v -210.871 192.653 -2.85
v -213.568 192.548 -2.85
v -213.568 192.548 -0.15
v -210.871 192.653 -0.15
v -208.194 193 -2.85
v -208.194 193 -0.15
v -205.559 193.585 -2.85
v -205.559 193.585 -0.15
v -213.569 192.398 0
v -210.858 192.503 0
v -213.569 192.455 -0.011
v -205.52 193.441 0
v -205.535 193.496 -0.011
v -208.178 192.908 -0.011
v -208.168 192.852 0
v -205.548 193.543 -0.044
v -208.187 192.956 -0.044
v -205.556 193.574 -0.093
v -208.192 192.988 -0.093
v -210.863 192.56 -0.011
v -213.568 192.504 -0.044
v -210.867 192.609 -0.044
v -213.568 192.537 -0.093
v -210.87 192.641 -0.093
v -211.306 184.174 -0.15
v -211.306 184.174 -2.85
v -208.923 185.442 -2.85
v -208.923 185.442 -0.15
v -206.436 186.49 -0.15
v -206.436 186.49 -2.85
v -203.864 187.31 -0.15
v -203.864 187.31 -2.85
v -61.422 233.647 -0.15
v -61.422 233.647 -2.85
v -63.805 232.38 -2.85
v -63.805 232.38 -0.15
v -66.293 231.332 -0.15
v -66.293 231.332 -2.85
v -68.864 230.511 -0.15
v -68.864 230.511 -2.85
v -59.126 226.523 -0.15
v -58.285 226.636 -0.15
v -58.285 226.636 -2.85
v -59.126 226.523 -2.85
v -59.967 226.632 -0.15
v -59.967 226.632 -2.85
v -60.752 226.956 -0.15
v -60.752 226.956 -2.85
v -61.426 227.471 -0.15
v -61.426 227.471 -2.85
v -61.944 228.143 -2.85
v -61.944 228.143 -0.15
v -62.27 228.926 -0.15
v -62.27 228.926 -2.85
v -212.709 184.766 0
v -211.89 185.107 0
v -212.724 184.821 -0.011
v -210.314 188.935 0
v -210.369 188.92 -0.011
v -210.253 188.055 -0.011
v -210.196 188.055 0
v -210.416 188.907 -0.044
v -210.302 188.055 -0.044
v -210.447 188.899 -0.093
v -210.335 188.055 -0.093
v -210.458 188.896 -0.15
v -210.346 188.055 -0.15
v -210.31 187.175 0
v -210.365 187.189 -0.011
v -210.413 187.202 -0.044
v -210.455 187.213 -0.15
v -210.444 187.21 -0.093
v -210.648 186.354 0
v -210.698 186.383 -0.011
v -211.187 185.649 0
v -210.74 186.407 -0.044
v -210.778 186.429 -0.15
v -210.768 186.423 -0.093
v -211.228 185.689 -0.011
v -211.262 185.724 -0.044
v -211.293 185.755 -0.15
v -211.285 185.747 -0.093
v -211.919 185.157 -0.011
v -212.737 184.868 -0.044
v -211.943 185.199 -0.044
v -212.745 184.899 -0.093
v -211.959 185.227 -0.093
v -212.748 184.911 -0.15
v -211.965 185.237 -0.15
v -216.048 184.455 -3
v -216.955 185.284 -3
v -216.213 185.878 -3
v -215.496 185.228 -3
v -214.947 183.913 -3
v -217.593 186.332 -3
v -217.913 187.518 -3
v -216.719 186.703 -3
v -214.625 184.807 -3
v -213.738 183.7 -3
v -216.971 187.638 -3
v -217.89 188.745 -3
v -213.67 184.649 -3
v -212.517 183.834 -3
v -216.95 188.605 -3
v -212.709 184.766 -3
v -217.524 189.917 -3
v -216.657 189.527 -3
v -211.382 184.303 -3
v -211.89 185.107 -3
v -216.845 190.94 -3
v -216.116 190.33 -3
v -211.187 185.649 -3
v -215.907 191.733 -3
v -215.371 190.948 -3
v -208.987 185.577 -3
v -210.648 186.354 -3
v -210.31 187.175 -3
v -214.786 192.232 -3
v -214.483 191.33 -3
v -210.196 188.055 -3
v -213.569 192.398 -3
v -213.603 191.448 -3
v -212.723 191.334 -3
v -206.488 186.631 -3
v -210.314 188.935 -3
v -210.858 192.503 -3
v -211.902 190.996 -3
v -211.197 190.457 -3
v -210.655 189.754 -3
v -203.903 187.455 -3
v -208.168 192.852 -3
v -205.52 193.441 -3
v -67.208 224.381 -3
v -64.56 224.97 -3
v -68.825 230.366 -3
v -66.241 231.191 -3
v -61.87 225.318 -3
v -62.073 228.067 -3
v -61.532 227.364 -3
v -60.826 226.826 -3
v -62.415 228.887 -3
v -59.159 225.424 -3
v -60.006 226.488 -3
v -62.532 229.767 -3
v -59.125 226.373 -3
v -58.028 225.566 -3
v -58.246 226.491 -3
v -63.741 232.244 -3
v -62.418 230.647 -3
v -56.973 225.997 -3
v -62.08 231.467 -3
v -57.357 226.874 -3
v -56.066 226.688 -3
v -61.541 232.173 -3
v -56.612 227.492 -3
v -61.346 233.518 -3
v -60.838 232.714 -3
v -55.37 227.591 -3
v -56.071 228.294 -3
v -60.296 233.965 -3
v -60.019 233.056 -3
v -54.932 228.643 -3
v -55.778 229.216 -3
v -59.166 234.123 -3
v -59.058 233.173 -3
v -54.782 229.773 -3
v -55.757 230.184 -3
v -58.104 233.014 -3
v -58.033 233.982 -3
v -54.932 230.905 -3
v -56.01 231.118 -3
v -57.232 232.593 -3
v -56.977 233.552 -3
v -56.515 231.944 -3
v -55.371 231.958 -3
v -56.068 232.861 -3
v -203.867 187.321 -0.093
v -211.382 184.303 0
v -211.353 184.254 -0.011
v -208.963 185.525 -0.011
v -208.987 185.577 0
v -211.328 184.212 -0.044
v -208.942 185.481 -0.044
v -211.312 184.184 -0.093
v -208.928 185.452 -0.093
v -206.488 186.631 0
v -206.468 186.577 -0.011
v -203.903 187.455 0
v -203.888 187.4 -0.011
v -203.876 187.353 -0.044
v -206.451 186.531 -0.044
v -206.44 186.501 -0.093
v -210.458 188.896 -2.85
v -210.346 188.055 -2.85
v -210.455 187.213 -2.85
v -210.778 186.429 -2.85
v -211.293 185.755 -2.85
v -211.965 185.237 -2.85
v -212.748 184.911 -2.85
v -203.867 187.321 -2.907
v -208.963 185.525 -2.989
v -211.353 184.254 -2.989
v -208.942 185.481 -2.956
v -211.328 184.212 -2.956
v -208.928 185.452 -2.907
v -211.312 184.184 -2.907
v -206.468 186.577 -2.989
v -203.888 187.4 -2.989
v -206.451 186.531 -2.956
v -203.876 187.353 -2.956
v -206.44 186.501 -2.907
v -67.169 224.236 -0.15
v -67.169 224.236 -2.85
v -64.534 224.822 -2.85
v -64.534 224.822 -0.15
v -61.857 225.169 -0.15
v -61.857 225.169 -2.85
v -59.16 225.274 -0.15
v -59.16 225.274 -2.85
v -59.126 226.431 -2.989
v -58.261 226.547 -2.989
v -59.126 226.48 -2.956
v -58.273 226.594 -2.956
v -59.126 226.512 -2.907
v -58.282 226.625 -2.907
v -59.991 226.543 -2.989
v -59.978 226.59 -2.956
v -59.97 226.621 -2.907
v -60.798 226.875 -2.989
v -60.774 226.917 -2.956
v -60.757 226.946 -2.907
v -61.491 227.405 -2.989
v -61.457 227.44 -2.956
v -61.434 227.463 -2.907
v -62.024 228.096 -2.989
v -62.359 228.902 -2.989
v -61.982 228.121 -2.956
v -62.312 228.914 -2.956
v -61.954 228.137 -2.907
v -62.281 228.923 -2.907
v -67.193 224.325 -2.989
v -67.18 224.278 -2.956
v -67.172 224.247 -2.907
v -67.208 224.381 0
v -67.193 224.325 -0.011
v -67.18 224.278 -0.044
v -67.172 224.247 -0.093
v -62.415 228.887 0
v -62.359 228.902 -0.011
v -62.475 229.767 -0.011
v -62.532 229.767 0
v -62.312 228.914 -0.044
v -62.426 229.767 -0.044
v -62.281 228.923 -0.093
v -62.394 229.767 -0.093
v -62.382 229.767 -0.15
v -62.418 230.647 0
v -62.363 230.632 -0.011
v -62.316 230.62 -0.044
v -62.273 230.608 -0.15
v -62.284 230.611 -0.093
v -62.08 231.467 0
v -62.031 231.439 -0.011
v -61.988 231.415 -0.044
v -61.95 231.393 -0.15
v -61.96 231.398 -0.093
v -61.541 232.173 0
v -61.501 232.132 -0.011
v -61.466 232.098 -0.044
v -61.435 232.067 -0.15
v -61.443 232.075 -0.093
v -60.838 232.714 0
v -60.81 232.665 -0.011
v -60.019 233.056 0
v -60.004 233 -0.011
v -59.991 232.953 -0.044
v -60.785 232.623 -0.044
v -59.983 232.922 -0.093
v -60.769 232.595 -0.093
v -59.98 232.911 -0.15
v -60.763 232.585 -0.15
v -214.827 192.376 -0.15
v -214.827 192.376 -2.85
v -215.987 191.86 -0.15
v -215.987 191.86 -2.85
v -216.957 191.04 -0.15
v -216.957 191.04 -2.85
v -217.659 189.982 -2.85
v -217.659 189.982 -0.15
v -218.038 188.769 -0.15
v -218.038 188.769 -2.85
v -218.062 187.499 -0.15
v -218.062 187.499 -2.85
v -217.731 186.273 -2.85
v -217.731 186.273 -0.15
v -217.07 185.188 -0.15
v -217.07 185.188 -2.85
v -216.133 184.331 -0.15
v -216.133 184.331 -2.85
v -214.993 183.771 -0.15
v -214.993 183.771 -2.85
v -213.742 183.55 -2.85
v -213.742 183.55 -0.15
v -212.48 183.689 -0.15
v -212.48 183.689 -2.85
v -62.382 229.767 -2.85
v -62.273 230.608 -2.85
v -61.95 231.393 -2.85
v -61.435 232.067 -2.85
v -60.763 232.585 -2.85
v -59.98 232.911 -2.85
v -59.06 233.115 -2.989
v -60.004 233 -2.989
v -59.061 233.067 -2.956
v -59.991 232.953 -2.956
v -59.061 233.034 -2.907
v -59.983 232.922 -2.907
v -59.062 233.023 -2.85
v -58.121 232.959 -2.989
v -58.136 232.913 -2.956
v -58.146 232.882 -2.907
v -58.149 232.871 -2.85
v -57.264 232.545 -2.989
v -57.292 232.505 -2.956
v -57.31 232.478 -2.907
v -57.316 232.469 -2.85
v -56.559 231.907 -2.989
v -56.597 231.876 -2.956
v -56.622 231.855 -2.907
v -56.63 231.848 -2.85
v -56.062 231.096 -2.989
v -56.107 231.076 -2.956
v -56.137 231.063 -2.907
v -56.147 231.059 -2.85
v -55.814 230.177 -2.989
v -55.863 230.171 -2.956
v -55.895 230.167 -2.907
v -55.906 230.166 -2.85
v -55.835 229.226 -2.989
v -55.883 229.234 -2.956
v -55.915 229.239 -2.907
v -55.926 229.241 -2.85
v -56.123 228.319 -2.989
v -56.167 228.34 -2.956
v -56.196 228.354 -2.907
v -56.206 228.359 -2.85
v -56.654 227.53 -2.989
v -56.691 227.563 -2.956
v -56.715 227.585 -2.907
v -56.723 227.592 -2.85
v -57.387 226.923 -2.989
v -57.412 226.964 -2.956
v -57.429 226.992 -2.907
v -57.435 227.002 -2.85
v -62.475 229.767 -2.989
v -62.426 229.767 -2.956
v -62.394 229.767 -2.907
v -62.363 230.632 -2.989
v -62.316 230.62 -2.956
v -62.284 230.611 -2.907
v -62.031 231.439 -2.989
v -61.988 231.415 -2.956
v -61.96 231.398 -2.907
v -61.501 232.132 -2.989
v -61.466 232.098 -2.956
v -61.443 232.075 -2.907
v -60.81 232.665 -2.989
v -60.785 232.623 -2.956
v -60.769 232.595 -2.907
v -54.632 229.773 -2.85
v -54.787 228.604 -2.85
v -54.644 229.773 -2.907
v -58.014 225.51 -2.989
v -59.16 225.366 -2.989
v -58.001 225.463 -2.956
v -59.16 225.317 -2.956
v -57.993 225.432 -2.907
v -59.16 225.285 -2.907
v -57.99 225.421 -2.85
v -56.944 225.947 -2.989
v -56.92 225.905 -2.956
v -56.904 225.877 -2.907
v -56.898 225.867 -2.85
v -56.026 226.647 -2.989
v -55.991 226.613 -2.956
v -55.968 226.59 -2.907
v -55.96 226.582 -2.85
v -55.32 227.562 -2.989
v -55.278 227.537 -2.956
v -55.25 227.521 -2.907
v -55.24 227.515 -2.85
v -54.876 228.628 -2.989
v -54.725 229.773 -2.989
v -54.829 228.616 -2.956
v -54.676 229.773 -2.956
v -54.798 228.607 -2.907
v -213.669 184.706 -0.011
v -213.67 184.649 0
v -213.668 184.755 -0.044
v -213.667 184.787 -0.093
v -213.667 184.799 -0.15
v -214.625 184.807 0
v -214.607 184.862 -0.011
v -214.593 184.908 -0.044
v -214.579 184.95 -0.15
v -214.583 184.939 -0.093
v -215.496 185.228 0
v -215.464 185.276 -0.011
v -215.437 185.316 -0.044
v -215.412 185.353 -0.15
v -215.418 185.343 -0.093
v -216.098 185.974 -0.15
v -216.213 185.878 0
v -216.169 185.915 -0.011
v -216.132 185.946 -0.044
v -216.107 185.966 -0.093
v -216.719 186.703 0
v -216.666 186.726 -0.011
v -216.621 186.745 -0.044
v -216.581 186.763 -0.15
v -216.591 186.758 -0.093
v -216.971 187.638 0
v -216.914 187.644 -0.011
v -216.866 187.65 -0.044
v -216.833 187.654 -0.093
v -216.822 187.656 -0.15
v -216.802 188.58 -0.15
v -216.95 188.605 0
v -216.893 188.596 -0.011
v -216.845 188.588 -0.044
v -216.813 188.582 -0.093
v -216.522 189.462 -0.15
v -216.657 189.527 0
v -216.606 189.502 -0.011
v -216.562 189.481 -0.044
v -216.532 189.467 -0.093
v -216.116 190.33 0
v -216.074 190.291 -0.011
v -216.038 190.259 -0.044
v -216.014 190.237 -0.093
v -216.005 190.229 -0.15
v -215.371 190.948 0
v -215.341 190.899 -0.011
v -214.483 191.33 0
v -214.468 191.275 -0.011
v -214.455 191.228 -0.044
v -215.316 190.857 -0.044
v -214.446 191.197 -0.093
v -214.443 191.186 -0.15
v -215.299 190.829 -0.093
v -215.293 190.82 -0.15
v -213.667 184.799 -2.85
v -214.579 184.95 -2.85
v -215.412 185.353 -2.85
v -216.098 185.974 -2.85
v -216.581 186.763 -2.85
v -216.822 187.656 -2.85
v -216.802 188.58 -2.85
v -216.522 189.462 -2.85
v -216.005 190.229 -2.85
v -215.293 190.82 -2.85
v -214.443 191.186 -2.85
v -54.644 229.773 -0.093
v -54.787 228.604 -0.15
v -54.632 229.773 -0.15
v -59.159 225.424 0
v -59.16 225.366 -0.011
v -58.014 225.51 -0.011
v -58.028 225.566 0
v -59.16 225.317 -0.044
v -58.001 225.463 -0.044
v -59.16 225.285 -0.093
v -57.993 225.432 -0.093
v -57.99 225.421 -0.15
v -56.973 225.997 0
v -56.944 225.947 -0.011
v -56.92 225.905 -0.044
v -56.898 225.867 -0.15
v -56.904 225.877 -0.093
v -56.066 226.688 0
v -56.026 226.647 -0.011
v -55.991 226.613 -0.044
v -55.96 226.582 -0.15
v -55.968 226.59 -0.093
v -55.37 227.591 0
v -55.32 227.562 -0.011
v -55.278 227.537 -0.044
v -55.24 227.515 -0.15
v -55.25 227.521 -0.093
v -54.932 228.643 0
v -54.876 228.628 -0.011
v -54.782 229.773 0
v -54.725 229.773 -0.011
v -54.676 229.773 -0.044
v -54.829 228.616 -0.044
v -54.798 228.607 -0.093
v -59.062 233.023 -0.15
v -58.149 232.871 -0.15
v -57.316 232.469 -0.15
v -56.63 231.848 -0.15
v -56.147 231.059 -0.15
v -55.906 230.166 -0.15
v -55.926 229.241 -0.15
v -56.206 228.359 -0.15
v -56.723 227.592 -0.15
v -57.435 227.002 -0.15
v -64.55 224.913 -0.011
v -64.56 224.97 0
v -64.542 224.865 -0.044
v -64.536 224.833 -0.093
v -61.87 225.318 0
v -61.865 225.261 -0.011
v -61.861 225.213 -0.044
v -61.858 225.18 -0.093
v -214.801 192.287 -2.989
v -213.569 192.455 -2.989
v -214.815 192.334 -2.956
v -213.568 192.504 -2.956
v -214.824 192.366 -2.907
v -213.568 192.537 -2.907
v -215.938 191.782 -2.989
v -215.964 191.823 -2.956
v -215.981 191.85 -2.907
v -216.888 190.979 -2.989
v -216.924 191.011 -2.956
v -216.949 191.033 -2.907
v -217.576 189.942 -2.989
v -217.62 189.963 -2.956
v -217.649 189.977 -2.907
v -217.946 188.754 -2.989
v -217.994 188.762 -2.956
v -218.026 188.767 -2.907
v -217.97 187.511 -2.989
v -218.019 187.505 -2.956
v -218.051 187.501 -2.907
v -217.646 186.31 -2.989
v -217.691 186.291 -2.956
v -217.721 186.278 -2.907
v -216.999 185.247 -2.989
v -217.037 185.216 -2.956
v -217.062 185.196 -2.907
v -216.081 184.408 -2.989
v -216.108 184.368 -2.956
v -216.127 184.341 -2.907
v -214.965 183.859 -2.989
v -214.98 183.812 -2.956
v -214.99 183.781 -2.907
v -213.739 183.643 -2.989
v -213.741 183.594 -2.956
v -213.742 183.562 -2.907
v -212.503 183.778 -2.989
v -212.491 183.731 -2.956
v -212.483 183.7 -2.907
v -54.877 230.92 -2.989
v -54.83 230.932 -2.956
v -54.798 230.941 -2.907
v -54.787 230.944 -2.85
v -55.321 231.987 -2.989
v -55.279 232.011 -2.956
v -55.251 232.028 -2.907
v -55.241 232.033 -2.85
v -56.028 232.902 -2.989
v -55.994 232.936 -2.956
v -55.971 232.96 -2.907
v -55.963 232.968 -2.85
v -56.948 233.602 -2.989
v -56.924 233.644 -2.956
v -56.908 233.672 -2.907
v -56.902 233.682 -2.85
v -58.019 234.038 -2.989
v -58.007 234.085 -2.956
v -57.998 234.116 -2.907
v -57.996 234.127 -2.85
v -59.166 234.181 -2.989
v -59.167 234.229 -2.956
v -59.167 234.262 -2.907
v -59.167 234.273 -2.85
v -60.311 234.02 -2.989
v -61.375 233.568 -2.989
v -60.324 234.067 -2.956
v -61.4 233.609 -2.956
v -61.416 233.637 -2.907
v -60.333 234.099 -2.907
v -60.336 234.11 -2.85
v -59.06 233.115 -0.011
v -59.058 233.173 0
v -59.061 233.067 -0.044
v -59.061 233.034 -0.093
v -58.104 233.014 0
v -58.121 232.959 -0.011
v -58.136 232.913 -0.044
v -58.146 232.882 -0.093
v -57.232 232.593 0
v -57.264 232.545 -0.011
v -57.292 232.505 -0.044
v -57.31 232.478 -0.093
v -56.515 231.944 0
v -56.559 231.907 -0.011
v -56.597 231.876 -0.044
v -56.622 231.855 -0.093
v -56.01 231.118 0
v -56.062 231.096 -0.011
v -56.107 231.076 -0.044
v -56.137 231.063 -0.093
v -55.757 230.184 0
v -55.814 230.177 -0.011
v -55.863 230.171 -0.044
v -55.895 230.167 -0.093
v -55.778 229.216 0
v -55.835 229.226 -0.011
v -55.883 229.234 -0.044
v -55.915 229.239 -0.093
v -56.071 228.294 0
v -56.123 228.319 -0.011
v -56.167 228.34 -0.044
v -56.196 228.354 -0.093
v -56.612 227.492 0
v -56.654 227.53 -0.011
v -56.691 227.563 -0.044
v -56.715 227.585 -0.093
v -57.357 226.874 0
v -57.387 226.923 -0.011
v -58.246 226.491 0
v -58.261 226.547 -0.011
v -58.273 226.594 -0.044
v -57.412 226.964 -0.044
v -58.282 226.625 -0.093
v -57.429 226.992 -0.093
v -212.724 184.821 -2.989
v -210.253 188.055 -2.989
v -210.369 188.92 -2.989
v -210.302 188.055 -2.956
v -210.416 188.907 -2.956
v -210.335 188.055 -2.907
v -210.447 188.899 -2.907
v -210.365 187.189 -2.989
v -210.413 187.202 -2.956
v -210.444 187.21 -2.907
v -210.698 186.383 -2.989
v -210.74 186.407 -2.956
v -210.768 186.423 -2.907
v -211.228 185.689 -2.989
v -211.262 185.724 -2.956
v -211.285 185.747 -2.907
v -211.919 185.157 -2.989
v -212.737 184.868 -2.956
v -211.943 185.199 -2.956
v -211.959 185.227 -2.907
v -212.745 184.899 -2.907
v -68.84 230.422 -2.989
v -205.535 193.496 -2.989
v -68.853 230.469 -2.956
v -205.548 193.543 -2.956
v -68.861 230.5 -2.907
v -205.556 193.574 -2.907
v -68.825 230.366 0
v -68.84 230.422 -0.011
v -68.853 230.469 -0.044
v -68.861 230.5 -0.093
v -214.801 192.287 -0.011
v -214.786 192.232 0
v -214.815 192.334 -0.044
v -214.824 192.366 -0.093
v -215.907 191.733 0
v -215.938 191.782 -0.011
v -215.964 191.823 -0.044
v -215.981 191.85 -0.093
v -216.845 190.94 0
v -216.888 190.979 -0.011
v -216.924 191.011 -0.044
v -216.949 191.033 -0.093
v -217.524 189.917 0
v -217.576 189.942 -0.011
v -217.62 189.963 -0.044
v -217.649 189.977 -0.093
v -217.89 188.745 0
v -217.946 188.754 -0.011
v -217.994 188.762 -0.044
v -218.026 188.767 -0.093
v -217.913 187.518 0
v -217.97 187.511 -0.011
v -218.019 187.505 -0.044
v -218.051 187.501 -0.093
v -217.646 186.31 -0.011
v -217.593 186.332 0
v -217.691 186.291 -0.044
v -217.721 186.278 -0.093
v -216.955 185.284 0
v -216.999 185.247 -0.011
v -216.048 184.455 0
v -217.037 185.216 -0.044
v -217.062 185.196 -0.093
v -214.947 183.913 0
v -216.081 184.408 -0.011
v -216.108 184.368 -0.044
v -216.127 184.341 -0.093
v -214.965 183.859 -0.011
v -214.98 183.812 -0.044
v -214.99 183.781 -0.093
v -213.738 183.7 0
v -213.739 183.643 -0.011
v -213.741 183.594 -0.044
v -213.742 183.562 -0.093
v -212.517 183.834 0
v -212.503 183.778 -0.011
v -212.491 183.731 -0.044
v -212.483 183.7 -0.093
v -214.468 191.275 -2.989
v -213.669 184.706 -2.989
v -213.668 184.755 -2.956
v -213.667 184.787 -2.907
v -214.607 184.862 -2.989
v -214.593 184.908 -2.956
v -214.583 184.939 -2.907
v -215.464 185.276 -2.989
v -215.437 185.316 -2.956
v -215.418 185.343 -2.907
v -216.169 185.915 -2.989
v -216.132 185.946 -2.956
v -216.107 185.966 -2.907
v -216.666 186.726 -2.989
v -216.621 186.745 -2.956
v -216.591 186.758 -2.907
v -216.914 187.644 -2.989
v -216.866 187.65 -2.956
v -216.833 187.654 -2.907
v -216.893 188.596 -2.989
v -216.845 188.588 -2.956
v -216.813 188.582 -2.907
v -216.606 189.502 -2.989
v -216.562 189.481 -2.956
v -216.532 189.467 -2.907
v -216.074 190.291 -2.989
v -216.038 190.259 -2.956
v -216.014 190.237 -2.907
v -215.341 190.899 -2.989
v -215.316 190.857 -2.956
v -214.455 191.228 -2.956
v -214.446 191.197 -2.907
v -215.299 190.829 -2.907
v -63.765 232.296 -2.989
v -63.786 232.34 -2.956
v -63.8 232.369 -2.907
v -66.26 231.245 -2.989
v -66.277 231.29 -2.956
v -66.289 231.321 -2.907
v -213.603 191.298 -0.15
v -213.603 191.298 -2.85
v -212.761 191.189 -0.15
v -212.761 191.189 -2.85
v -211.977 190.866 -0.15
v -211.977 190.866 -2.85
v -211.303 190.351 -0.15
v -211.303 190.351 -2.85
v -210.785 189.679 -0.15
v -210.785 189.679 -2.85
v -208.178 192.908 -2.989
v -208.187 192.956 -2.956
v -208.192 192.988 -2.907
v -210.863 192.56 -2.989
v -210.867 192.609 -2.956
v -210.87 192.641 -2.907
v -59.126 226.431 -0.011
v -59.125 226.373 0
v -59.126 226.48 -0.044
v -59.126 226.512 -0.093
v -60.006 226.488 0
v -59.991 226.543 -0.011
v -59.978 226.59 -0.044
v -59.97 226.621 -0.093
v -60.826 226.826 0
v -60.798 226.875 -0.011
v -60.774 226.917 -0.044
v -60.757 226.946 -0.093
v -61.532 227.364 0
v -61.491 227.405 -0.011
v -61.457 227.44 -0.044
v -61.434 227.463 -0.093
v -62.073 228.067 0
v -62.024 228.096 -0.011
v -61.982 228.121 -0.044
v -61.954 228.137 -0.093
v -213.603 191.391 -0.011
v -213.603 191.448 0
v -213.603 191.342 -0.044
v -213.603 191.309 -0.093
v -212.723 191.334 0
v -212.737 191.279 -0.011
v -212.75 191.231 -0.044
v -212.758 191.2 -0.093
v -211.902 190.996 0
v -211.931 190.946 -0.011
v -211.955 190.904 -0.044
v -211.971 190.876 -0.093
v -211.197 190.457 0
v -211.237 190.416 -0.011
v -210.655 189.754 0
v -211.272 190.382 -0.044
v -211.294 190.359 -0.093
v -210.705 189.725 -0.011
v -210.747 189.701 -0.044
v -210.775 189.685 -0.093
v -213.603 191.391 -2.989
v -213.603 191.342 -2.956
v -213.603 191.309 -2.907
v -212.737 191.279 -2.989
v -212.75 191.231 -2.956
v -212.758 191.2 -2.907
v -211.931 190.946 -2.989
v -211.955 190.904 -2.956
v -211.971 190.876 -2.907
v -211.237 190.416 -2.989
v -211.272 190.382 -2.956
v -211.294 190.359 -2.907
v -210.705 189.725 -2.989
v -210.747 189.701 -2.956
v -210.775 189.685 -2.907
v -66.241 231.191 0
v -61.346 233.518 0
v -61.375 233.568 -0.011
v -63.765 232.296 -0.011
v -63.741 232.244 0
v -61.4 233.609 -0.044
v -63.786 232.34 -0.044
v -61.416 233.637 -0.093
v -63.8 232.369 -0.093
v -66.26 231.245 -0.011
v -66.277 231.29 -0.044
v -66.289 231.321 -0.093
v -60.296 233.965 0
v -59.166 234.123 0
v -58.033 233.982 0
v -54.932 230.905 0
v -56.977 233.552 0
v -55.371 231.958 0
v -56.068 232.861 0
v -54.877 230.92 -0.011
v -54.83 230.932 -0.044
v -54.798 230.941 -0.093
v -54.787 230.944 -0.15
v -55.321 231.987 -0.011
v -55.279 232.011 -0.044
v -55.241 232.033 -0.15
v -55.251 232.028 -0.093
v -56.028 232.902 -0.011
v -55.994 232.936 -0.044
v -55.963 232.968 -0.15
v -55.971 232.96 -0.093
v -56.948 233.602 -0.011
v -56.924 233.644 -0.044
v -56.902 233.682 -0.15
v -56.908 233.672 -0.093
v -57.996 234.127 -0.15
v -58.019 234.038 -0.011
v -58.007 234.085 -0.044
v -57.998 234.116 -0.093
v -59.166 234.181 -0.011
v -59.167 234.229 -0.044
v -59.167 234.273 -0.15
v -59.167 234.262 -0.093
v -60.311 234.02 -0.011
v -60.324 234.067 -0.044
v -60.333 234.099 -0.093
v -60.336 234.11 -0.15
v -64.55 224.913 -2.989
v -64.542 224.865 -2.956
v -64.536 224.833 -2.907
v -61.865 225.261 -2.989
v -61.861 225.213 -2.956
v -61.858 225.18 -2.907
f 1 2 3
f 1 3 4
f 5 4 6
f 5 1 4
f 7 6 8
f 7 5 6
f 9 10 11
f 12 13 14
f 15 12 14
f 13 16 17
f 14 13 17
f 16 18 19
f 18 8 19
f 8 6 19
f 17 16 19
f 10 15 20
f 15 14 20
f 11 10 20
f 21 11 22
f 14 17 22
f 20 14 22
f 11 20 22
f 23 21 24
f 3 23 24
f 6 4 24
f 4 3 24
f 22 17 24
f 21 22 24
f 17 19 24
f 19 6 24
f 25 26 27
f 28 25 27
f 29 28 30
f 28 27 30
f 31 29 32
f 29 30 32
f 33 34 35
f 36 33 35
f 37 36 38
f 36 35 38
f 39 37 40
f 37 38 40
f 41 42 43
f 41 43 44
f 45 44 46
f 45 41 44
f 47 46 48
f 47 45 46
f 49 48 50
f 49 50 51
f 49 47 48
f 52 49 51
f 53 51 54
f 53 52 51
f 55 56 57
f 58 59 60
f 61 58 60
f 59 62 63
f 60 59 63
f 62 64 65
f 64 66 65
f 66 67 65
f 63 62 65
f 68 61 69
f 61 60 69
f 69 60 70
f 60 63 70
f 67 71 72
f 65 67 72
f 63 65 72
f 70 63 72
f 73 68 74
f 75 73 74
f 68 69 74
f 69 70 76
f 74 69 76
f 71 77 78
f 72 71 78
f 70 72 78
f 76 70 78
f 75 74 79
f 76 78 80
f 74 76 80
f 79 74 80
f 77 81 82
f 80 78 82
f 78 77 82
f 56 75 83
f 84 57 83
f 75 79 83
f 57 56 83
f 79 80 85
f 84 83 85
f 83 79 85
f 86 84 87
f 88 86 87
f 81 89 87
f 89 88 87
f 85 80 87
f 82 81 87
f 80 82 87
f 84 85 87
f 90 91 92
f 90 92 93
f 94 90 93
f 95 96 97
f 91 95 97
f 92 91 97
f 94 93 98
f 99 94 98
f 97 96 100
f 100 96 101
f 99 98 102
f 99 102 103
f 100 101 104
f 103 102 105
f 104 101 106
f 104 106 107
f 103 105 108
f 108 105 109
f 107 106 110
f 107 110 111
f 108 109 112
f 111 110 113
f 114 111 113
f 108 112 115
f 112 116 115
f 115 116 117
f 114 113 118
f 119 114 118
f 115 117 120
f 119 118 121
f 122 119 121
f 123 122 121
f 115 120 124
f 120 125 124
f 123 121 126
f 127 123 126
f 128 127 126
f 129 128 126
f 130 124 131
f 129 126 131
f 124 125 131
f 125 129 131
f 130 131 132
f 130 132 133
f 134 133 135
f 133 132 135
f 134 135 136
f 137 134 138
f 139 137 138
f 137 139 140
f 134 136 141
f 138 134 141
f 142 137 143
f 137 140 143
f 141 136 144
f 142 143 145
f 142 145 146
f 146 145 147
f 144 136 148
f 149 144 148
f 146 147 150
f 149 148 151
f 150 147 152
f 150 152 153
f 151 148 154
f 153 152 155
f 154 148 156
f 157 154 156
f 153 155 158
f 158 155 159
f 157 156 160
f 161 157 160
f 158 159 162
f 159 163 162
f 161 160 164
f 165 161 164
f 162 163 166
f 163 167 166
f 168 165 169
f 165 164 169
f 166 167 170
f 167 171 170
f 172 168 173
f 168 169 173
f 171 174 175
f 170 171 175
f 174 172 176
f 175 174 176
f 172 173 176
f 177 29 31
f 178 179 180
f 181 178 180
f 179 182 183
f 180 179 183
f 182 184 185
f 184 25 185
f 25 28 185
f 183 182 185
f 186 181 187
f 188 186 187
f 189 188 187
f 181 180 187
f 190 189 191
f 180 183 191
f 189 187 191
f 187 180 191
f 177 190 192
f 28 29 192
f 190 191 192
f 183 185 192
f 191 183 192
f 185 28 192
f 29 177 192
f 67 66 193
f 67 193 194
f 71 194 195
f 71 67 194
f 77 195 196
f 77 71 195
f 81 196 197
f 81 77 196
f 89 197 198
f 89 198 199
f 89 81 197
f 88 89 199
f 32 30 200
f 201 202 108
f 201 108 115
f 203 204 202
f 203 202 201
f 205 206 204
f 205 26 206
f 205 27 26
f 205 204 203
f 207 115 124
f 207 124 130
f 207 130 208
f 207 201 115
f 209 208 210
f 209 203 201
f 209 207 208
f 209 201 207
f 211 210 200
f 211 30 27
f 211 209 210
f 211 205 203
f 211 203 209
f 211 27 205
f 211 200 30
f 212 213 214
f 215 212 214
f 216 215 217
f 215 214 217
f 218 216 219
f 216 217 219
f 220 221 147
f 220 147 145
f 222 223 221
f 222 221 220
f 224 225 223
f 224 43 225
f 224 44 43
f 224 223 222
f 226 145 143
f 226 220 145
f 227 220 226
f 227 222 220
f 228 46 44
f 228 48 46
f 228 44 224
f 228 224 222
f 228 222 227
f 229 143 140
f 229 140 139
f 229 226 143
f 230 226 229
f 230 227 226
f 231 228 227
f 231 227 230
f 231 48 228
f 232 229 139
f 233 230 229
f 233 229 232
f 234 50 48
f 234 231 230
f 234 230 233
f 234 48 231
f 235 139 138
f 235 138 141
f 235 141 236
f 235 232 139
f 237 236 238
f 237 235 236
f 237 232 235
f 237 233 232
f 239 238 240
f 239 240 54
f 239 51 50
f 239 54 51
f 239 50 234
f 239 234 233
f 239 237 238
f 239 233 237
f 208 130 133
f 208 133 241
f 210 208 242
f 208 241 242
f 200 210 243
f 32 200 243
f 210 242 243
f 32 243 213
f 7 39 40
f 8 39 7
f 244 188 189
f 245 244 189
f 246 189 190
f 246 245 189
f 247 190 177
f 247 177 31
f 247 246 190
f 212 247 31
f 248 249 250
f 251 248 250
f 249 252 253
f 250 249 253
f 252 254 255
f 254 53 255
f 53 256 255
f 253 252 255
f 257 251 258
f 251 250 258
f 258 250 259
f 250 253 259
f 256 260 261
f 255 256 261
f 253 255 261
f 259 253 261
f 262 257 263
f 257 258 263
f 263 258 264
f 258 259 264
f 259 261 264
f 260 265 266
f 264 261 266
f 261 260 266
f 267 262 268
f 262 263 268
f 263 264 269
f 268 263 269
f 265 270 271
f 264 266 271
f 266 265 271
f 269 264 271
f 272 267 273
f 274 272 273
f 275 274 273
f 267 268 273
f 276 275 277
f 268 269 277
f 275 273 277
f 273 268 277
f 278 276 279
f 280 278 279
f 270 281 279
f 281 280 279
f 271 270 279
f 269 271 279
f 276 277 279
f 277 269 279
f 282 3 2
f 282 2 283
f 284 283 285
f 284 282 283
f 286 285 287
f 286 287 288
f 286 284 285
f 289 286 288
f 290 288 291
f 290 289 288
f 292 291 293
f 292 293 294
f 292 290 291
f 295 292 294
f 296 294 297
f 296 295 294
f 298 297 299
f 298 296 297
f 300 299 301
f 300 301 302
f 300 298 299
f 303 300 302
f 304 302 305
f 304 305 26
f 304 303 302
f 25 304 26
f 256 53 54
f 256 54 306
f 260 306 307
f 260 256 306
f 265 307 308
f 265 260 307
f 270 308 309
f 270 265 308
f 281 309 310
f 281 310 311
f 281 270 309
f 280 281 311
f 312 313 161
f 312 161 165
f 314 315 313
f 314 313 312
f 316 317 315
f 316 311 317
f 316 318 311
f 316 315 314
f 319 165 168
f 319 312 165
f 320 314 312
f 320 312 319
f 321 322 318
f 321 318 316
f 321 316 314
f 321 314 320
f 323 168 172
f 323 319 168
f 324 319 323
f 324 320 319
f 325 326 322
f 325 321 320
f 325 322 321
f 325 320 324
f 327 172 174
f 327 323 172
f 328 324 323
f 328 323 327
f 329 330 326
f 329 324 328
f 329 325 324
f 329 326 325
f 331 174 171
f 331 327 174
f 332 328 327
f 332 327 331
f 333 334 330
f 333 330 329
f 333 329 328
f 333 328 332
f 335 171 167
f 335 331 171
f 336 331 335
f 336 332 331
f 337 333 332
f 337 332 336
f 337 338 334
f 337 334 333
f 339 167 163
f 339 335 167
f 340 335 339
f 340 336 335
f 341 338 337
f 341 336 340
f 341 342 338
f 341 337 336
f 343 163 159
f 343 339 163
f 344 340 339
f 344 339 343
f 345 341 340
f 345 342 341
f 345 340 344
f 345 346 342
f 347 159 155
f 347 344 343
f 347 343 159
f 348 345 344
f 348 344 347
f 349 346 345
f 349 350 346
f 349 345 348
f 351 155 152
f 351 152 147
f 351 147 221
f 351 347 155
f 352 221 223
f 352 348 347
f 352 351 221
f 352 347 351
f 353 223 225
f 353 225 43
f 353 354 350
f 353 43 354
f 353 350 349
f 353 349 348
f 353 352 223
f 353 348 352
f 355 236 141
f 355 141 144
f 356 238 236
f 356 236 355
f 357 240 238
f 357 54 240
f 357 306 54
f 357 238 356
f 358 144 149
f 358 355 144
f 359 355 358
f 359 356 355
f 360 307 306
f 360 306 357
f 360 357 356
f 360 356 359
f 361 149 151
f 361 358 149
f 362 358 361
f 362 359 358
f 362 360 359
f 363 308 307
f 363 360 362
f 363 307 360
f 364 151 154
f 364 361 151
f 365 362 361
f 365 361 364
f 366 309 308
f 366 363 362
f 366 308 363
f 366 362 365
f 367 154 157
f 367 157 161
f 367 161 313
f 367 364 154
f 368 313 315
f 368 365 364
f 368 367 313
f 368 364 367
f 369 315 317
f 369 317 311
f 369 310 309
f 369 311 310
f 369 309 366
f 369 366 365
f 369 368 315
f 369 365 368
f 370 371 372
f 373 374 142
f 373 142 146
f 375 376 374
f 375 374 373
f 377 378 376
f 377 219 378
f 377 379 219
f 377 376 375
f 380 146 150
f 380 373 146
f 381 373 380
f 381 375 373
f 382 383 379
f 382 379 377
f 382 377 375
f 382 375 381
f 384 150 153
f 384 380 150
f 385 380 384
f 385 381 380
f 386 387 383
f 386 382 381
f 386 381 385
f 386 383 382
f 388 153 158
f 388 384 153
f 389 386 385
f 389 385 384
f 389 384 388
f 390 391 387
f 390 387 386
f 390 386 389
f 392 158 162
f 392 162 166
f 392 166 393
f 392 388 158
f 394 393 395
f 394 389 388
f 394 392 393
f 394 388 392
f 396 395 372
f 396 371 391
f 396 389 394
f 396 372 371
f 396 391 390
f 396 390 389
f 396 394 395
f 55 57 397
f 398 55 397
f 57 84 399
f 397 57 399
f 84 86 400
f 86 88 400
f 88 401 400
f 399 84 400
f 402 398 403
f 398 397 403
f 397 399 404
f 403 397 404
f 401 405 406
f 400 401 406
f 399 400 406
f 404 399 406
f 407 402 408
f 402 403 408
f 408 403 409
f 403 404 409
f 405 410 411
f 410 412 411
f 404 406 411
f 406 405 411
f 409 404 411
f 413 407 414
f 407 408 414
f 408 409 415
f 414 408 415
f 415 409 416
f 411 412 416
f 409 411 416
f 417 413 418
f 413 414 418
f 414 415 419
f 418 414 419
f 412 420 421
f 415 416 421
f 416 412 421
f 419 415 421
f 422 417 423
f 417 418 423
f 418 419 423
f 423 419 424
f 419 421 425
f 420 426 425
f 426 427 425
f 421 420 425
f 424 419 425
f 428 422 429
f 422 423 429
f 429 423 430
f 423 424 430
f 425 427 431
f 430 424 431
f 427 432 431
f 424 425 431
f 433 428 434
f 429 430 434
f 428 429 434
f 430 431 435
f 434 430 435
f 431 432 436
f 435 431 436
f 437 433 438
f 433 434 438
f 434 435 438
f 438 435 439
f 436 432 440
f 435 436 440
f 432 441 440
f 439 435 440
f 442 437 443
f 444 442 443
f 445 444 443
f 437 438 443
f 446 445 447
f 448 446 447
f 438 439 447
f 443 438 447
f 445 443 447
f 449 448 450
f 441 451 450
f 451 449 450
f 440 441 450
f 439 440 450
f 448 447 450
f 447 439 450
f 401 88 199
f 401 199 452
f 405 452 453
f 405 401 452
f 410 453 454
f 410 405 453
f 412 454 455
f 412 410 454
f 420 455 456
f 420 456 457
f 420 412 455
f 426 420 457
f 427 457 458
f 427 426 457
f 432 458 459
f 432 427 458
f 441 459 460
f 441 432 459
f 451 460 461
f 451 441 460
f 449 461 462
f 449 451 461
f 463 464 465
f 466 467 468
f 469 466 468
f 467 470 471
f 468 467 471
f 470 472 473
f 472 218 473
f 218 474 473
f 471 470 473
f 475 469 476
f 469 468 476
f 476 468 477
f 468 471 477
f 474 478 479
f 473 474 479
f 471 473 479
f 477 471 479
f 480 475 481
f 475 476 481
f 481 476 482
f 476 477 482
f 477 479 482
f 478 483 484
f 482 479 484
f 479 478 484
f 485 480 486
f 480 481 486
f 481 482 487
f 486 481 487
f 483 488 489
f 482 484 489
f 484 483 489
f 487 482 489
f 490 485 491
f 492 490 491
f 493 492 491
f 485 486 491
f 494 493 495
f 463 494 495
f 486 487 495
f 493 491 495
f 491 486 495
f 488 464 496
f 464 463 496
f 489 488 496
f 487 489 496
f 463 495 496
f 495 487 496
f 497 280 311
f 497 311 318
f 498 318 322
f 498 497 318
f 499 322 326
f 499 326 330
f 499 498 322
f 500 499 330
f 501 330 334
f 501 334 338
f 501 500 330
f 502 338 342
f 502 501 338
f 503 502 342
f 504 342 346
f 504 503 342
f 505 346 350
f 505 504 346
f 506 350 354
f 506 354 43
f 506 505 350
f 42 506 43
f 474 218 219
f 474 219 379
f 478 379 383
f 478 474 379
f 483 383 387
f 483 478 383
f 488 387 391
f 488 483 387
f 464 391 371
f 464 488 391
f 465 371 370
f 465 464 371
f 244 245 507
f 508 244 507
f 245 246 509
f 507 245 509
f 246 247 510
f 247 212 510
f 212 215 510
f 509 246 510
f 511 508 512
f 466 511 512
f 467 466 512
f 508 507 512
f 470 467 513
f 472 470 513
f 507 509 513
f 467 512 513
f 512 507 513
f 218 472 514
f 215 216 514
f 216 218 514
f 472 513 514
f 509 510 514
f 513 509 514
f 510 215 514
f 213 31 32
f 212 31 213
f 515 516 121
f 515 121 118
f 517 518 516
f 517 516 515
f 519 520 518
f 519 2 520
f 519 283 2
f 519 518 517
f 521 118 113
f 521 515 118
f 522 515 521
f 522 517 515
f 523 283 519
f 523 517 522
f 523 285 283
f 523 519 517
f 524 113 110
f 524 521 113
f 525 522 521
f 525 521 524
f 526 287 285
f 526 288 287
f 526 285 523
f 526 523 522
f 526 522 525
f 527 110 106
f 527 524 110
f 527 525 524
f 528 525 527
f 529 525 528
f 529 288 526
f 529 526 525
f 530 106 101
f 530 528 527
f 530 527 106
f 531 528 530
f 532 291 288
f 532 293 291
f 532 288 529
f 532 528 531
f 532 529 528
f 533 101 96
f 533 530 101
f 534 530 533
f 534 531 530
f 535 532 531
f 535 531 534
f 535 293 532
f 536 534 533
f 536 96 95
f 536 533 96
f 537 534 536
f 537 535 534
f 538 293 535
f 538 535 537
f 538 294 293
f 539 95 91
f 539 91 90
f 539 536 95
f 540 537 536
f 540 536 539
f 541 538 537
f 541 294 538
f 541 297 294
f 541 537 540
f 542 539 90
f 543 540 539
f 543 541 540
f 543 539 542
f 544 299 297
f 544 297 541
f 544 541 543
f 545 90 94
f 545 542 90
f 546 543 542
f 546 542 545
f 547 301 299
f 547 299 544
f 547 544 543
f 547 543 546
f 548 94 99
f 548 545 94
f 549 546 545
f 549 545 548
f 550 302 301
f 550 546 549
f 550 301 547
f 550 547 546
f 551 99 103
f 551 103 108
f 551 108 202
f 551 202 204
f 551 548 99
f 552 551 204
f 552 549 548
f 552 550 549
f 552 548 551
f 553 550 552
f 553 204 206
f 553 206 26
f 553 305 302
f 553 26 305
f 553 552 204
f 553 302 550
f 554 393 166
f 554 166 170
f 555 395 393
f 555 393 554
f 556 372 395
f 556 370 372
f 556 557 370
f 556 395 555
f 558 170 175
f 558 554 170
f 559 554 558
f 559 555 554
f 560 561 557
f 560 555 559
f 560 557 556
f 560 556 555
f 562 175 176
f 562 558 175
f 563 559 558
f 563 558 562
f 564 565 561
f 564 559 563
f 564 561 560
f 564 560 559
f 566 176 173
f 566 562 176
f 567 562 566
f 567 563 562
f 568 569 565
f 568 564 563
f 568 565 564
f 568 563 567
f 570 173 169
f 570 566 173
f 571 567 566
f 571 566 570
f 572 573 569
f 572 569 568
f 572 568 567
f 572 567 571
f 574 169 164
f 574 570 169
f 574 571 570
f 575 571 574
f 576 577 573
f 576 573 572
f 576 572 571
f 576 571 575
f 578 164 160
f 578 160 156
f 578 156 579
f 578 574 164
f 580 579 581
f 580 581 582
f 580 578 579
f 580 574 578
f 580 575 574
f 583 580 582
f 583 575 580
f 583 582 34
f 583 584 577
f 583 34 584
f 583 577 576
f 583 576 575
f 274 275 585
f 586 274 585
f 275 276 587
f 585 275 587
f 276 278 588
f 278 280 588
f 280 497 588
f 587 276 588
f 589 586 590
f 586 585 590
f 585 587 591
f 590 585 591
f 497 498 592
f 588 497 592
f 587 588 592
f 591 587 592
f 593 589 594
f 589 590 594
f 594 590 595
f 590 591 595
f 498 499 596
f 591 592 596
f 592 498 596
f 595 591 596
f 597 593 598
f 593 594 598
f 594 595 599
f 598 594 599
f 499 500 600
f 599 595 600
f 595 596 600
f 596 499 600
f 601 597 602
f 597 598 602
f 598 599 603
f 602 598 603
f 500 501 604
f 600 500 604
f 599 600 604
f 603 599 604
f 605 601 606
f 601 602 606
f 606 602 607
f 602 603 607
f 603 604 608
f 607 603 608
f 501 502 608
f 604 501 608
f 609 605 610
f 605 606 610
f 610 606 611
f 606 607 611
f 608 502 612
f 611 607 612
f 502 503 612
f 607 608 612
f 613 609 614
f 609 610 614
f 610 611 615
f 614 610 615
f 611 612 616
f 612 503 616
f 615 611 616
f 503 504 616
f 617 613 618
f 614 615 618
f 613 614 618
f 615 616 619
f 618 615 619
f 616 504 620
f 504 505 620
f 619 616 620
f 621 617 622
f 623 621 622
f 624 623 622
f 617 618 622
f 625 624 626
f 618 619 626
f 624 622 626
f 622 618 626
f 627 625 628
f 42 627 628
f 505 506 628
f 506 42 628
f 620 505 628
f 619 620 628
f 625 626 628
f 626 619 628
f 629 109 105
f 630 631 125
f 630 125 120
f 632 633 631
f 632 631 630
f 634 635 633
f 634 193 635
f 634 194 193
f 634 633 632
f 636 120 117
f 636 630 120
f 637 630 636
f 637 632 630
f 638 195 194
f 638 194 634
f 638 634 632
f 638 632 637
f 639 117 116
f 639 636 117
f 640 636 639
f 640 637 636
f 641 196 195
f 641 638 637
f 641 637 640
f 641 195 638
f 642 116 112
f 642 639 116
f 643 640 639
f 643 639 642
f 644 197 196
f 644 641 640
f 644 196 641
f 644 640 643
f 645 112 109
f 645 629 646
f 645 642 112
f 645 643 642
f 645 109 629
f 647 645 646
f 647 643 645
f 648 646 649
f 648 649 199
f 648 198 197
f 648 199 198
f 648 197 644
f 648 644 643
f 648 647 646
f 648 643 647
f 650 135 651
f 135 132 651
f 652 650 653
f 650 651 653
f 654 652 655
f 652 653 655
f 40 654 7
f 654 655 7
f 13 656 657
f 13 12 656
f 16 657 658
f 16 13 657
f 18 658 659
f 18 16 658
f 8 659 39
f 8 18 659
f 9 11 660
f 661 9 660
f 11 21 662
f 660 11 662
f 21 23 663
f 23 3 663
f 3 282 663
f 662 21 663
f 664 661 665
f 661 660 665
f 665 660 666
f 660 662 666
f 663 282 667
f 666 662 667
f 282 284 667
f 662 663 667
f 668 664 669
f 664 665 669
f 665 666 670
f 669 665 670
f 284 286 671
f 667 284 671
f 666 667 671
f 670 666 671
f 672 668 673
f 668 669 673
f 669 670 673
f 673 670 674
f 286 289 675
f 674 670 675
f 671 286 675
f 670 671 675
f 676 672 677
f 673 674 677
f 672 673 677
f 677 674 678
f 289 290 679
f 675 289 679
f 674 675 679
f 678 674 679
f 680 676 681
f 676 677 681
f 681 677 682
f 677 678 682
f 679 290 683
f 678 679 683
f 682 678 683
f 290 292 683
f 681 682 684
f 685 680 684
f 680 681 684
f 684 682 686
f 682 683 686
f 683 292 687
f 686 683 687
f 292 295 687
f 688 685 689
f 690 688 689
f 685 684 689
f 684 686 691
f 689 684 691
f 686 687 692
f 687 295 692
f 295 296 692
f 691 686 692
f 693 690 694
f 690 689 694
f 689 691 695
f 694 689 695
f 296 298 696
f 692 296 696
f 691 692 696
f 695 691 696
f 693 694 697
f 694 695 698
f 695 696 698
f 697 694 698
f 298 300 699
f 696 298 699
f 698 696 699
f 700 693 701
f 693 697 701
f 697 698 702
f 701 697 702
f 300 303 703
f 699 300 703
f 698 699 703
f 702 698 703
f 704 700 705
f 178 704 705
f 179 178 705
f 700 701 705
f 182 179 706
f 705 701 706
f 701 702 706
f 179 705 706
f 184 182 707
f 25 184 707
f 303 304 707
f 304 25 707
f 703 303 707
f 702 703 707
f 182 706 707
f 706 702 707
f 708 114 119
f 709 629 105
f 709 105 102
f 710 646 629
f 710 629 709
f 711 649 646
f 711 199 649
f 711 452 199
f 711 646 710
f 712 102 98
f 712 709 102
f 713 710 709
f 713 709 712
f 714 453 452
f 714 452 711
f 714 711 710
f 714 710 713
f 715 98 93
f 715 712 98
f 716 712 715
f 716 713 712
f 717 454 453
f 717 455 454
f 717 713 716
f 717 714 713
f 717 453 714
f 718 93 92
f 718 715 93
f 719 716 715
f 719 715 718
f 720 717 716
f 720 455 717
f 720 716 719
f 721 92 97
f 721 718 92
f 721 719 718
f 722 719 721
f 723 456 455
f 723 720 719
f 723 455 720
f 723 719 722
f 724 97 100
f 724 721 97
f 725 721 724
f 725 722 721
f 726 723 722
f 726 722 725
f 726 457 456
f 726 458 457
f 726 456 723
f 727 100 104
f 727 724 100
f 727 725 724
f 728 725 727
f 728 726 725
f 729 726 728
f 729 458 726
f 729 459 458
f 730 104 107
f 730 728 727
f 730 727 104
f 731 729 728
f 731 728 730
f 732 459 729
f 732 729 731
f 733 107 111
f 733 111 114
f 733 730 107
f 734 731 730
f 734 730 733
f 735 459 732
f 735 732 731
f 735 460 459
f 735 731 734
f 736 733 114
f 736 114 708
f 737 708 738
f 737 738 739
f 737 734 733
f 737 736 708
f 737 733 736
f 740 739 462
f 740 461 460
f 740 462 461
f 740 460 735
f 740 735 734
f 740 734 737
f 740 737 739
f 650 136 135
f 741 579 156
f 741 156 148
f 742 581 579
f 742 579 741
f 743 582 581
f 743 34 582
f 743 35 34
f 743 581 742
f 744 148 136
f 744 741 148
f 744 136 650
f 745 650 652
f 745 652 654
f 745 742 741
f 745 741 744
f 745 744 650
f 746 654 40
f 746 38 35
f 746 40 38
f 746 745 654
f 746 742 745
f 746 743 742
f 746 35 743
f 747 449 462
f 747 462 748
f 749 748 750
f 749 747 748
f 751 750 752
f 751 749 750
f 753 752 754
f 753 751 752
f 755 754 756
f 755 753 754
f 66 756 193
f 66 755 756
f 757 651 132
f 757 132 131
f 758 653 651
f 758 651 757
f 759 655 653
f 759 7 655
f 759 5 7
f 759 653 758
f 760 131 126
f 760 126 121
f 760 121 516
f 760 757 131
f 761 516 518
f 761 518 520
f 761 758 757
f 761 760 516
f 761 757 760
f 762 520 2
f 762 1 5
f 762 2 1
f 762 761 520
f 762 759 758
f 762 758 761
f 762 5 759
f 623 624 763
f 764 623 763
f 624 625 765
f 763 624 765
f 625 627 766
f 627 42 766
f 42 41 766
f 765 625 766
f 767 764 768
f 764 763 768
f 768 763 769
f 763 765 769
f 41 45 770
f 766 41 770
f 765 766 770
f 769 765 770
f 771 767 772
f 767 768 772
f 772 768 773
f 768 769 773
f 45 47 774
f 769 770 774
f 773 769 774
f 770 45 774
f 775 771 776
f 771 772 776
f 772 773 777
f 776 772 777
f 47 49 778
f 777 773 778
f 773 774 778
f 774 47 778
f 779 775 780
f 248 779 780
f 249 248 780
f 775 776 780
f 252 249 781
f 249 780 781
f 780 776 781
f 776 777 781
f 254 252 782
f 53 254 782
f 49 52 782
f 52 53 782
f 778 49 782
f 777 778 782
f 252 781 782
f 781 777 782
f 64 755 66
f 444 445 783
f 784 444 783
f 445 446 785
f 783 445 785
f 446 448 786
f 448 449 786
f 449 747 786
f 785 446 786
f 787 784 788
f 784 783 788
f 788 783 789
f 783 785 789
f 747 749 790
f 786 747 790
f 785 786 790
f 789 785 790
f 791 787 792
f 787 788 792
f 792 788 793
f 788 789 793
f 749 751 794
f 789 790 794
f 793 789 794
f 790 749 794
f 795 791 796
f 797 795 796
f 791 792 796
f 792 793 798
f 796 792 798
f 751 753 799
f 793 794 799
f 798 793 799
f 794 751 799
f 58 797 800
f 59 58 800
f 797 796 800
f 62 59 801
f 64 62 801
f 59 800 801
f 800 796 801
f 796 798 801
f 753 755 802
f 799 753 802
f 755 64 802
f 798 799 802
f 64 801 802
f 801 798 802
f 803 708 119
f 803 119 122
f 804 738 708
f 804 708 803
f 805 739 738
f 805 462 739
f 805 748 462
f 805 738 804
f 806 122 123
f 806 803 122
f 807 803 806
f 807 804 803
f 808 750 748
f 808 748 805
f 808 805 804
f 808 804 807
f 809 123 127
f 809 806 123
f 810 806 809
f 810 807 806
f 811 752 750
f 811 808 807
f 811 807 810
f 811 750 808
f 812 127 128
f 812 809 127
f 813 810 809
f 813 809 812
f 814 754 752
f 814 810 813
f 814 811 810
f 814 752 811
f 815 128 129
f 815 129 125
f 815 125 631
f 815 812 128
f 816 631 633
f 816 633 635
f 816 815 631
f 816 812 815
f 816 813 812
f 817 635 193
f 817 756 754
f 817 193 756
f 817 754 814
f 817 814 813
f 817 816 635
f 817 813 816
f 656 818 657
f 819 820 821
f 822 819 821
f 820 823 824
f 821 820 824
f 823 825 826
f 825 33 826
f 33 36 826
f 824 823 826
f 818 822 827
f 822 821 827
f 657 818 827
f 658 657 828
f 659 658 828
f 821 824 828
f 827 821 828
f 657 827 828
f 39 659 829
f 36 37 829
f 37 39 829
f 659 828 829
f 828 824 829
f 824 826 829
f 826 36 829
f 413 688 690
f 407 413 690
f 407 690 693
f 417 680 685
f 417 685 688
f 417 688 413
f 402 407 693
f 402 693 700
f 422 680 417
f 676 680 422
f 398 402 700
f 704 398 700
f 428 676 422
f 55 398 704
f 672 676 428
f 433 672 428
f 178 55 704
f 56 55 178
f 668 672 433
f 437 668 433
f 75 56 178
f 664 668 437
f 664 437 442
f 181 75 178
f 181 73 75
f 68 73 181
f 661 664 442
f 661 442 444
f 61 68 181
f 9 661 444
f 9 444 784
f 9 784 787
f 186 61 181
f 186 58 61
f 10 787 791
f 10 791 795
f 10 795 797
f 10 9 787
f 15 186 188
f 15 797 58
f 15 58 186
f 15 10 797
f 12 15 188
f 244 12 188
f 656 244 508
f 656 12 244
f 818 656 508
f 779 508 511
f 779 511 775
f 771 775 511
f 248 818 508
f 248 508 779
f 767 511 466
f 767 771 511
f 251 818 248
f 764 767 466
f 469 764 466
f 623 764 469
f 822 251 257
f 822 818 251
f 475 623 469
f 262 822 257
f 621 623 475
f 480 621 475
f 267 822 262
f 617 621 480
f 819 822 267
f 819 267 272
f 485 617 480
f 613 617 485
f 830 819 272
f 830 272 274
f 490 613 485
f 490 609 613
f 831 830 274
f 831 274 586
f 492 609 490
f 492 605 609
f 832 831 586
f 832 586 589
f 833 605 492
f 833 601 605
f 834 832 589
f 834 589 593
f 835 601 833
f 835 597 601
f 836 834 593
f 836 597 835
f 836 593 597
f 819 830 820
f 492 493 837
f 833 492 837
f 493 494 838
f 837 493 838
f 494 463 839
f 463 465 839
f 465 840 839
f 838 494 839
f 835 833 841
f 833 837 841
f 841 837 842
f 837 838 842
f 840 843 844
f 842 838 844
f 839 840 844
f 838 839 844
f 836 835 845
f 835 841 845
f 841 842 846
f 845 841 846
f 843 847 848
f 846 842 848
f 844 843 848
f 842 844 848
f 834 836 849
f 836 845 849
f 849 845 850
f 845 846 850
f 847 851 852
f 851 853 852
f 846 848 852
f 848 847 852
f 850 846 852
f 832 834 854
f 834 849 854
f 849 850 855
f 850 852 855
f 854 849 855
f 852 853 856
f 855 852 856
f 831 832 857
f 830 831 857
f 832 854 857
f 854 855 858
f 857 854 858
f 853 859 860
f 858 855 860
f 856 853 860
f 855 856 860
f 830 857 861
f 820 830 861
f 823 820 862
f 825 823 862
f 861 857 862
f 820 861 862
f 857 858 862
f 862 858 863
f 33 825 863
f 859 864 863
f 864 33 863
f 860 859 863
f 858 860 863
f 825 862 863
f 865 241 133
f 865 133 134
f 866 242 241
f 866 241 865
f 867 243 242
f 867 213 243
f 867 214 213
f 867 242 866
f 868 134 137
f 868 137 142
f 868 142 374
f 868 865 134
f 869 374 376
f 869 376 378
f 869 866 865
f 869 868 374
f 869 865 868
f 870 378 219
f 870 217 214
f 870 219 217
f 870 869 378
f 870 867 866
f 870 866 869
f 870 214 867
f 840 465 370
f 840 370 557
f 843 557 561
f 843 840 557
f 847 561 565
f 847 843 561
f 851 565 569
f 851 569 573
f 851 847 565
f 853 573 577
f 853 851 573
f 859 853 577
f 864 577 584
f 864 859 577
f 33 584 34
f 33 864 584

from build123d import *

# Parameters (mm, degrees)
BOSS_EXTRUDE1_DEPTH = 3
FILLET1_R           = 30
FILLET2_R           = 0.15


with BuildPart() as part:
    # Sketch2 → Boss-Extrude1 (new body)
    with BuildSketch(Plane.XY):
        with BuildLine():
            Line((-62.984695574, 232.099316618), (-59.979920905, 232.910999553))
            ThreePointArc((-59.979920905, 232.910999553), (-55.994832634, 230.621005781), (-58.284826407, 226.63591751))
            Line((-58.284826407, 226.63591751), (-61.289601076, 225.824234576))
            ThreePointArc((-61.289601076, 225.824234576), (-56.836455908, 225.90321801), (-54.632373656, 229.773458532))
            ThreePointArc((-54.632373656, 229.773458532), (-57.925196915, 234.108516123), (-62.984695574, 232.099316618))
        make_face()
        with BuildLine():
            Line((-63.476661224, 228.599931572), (-62.269914677, 228.925911283))
            ThreePointArc((-62.269914677, 228.925911283), (-61.950256595, 231.392728657), (-59.979920905, 232.910999553))
            Line((-59.979920905, 232.910999553), (-62.984695574, 232.099316618))
            ThreePointArc((-62.984695574, 232.099316618), (-63.588552029, 230.39993623), (-63.476661224, 228.599931572))
        make_face()
        with BuildLine():
            ThreePointArc((-58.284826407, 226.63591751), (-60.751643781, 226.955575592), (-62.269914677, 228.925911283))
            Line((-62.269914677, 228.925911283), (-63.476661224, 228.599931572))
            ThreePointArc((-63.476661224, 228.599931572), (-62.666994956, 226.988417731), (-61.289601076, 225.824234576))
            Line((-61.289601076, 225.824234576), (-58.284826407, 226.63591751))
        make_face()
        with BuildLine():
            Line((-209.251644063, 189.221582466), (-63.476661224, 228.599931572))
            ThreePointArc((-63.476661224, 228.599931572), (-63.588552029, 230.39993623), (-62.984695574, 232.099316618))
            Line((-62.984695574, 232.099316618), (-211.43870421, 191.997279462))
            ThreePointArc((-211.43870421, 191.997279462), (-210.06131033, 190.833096306), (-209.251644063, 189.221582466))
        make_face()
        with BuildLine():
            ThreePointArc((-61.289601076, 225.824234576), (-62.666994956, 226.988417731), (-63.476661224, 228.599931572))
            Line((-63.476661224, 228.599931572), (-209.251644063, 189.221582466))
            ThreePointArc((-209.251644063, 189.221582466), (-209.135029589, 188.639961725), (-209.095931631, 188.048055506))
            ThreePointArc((-209.095931631, 188.048055506), (-209.26087404, 186.840878765), (-209.743609712, 185.722197419))
            Line((-209.743609712, 185.722197419), (-61.289601076, 225.824234576))
        make_face()
        with BuildLine():
            Line((-214.44347888, 191.185596527), (-211.43870421, 191.997279462))
            ThreePointArc((-211.43870421, 191.997279462), (-217.940219199, 186.874528546), (-209.743609712, 185.722197419))
            Line((-209.743609712, 185.722197419), (-212.748384382, 184.910514484))
            ThreePointArc((-212.748384382, 184.910514484), (-216.733472652, 187.200508257), (-214.44347888, 191.185596527))
        make_face()
        with BuildLine():
            Line((-210.458390609, 188.895602755), (-209.251644063, 189.221582466))
            ThreePointArc((-209.251644063, 189.221582466), (-210.06131033, 190.833096306), (-211.43870421, 191.997279462))
            Line((-211.43870421, 191.997279462), (-214.44347888, 191.185596527))
            ThreePointArc((-214.44347888, 191.185596527), (-211.976661505, 190.865938445), (-210.458390609, 188.895602755))
        make_face()
        with BuildLine():
            ThreePointArc((-209.095931631, 188.048055506), (-209.135029589, 188.639961725), (-209.251644063, 189.221582466))
            Line((-209.251644063, 189.221582466), (-210.458390609, 188.895602755))
            ThreePointArc((-210.458390609, 188.895602755), (-210.778048691, 186.42878538), (-212.748384382, 184.910514484))
            Line((-212.748384382, 184.910514484), (-209.743609712, 185.722197419))
            ThreePointArc((-209.743609712, 185.722197419), (-209.26087404, 186.840878765), (-209.095931631, 188.048055506))
        make_face()
    extrude(amount=-BOSS_EXTRUDE1_DEPTH)

    # Fillet1
    fillet1_edges = [part.edges().sort_by_distance(p)[0] for p in [
        (-211.43870421, 191.997279462, -1.5),
        (-62.984695574, 232.099316618, -1.5),
        (-61.289601076, 225.824234576, -1.5),
        (-209.743609712, 185.722197419, -1.5),
    ]]
    fillet(fillet1_edges, radius=FILLET1_R)

    # Fillet2
    fillet2_edges = [part.edges().sort_by_distance(p)[0] for p in [
        (-216.733472652, 187.200508257, 0),
        (-54.788086088, 230.946985492, 0),
        (-54.788086088, 230.946985492, -3),
        (-137.211699892, 212.04829804, 0),
        (-137.211699892, 212.04829804, -3),
        (-135.516605394, 205.773215997, 0),
        (-135.516605394, 205.773215997, -3),
        (-217.940219199, 186.874528546, 0),
        (-217.940219199, 186.874528546, -3),
        (-65.037113368, 231.827660424, 0),
        (-55.994832634, 230.621005781, -3),
        (-65.037113368, 231.827660424, -3),
        (-63.199640786, 225.025507965, 0),
        (-63.199640786, 225.025507965, -3),
        (-207.691191918, 185.993853613, 0),
        (-207.691191918, 185.993853613, -3),
        (-209.528664501, 192.796006072, 0),
        (-209.528664501, 192.796006072, -3),
        (-216.733472652, 187.200508257, -3),
        (-55.994832634, 230.621005781, 0),
    ]]
    fillet(fillet2_edges, radius=FILLET2_R)


solid = part.part
